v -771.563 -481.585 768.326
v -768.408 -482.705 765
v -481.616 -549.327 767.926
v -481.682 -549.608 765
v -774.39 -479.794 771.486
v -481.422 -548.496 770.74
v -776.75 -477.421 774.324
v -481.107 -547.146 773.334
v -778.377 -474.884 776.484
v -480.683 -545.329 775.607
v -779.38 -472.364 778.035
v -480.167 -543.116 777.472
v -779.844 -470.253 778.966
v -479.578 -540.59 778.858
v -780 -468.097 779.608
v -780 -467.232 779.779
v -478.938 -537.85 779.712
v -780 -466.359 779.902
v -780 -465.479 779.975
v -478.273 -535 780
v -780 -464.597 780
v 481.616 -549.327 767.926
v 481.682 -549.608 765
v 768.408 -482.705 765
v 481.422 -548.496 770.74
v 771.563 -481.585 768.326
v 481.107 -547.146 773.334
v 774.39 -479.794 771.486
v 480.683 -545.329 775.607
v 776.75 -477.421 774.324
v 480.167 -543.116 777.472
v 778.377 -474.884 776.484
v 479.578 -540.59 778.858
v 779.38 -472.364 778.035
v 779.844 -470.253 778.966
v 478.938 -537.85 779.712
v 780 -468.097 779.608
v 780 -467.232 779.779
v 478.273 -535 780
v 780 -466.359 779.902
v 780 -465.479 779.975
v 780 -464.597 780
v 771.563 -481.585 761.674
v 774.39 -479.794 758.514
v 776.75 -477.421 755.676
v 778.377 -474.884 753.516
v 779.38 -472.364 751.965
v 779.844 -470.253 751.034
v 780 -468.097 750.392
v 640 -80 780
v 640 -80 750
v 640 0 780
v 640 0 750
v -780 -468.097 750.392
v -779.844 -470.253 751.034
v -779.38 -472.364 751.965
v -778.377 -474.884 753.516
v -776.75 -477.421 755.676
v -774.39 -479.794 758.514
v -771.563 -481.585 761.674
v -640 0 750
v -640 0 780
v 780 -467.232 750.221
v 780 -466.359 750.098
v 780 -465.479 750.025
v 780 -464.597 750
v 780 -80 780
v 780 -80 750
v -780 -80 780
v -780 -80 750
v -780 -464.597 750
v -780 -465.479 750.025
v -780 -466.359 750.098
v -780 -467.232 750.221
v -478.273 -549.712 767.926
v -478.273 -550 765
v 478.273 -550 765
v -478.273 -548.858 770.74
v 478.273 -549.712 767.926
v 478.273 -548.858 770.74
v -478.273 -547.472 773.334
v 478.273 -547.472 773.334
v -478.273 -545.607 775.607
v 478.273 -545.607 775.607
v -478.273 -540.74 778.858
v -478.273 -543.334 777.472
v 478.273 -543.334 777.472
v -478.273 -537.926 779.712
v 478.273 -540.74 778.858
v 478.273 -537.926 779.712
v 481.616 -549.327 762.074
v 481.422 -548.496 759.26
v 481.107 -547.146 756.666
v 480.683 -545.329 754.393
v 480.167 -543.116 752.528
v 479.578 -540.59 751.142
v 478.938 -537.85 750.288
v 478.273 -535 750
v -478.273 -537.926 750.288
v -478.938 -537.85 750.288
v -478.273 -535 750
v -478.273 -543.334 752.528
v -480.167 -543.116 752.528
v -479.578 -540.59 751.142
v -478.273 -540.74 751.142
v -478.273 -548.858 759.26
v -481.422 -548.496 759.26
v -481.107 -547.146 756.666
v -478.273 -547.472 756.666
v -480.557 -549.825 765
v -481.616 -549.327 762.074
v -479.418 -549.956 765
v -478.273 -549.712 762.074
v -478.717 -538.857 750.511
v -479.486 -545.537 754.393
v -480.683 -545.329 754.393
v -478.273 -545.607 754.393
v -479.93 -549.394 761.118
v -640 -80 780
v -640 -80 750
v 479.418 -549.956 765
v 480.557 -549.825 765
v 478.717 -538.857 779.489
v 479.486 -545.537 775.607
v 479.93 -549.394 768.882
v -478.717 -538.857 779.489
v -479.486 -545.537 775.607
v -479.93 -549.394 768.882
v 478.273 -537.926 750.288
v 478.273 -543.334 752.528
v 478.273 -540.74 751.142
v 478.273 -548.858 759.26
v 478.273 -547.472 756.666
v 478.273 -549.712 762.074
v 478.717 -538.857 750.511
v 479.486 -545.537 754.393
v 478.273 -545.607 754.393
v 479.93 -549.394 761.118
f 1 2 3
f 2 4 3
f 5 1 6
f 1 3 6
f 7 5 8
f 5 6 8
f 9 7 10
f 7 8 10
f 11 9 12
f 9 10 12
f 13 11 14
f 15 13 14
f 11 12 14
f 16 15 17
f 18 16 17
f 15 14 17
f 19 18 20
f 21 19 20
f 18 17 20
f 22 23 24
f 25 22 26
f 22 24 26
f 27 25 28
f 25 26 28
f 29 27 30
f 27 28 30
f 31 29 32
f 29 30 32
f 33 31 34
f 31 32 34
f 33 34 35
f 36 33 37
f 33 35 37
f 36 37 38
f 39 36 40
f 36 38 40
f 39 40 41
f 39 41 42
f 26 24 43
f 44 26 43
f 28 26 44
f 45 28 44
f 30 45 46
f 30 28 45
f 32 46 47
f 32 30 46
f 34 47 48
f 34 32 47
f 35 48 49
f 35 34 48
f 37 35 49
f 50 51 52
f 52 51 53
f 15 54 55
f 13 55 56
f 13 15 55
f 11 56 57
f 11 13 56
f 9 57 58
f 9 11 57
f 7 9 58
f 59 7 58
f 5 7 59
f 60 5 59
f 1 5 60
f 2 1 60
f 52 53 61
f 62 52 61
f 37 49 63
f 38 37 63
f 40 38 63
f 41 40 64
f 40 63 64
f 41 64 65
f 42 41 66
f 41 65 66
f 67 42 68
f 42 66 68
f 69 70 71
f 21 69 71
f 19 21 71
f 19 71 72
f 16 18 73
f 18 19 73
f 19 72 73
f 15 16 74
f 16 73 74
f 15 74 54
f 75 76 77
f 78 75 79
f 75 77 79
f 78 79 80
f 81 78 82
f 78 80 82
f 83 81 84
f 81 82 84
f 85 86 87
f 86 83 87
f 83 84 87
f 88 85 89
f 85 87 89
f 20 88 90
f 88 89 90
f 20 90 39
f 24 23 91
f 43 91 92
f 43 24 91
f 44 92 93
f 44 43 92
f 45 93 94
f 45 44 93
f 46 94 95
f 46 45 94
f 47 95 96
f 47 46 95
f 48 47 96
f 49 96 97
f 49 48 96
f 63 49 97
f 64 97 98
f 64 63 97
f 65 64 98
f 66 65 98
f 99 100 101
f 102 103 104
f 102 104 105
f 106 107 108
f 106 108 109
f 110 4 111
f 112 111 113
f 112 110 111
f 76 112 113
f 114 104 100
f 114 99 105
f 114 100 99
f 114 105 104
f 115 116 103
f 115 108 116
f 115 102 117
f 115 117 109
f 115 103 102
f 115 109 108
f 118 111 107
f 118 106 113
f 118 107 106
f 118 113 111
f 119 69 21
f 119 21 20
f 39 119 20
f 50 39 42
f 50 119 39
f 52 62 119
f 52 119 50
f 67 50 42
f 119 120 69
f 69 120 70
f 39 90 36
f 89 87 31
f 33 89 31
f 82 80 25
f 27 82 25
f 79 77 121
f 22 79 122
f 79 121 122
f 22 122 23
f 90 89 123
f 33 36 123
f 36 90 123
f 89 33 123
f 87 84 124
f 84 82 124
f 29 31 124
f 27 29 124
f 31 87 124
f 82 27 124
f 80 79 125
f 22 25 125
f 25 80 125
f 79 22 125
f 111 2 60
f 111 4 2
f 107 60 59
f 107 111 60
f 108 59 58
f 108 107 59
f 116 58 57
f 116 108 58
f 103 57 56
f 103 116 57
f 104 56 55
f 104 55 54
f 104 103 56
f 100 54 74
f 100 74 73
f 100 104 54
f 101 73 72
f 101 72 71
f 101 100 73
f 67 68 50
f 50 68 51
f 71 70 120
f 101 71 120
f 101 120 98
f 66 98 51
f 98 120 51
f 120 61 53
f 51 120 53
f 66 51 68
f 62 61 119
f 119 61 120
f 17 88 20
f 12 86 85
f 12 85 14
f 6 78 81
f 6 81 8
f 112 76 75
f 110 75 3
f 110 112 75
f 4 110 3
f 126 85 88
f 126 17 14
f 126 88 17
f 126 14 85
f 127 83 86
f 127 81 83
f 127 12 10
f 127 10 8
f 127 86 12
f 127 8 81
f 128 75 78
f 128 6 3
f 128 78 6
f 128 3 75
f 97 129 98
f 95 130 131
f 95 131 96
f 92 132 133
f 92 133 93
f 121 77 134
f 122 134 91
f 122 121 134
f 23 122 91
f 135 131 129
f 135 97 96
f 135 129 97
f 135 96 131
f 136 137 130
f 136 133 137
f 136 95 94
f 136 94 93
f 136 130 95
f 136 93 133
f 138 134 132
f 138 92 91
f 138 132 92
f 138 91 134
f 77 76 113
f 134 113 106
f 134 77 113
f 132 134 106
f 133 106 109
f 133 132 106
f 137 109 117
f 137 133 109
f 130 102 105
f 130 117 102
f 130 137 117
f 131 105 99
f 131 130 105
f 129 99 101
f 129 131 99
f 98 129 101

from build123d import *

# Parameters (mm, degrees)
F2_DEPTH = 30
F3_R     = 14.99999


# Not quite as in the source:
# - a fillet or chamfer is up to 0.001 mm smaller than in the source, because OpenCascade refuses the exact size


with BuildPart() as f2:
    # F1 (on offset) → F2 (new body)
    with BuildSketch(Plane.XY.offset(750)):
        Polygon((640, 0), (-640, 0), (-640, -80), (-780, -80), (-780, -480), (-480, -550), (480, -550), (780, -480), (780, -80), (640, -80), align=None)
    extrude(amount=F2_DEPTH)

    # F3 (radius 15 in the source; OpenCascade refuses exactly that, so slightly less here)
    f3_edges = [f2.edges().sort_by_distance(p)[0] for p in [
        (-630, -515, 780),
        (-780, -480, 765),
        (-480, -550, 765),
        (-630, -515, 750),
        (480, -550, 765),
        (0, -550, 750),
        (0, -550, 780),
        (780, -480, 765),
        (630, -515, 750),
        (630, -515, 780),
    ]]
    fillet(f3_edges, radius=F3_R)


solid = f2.part
